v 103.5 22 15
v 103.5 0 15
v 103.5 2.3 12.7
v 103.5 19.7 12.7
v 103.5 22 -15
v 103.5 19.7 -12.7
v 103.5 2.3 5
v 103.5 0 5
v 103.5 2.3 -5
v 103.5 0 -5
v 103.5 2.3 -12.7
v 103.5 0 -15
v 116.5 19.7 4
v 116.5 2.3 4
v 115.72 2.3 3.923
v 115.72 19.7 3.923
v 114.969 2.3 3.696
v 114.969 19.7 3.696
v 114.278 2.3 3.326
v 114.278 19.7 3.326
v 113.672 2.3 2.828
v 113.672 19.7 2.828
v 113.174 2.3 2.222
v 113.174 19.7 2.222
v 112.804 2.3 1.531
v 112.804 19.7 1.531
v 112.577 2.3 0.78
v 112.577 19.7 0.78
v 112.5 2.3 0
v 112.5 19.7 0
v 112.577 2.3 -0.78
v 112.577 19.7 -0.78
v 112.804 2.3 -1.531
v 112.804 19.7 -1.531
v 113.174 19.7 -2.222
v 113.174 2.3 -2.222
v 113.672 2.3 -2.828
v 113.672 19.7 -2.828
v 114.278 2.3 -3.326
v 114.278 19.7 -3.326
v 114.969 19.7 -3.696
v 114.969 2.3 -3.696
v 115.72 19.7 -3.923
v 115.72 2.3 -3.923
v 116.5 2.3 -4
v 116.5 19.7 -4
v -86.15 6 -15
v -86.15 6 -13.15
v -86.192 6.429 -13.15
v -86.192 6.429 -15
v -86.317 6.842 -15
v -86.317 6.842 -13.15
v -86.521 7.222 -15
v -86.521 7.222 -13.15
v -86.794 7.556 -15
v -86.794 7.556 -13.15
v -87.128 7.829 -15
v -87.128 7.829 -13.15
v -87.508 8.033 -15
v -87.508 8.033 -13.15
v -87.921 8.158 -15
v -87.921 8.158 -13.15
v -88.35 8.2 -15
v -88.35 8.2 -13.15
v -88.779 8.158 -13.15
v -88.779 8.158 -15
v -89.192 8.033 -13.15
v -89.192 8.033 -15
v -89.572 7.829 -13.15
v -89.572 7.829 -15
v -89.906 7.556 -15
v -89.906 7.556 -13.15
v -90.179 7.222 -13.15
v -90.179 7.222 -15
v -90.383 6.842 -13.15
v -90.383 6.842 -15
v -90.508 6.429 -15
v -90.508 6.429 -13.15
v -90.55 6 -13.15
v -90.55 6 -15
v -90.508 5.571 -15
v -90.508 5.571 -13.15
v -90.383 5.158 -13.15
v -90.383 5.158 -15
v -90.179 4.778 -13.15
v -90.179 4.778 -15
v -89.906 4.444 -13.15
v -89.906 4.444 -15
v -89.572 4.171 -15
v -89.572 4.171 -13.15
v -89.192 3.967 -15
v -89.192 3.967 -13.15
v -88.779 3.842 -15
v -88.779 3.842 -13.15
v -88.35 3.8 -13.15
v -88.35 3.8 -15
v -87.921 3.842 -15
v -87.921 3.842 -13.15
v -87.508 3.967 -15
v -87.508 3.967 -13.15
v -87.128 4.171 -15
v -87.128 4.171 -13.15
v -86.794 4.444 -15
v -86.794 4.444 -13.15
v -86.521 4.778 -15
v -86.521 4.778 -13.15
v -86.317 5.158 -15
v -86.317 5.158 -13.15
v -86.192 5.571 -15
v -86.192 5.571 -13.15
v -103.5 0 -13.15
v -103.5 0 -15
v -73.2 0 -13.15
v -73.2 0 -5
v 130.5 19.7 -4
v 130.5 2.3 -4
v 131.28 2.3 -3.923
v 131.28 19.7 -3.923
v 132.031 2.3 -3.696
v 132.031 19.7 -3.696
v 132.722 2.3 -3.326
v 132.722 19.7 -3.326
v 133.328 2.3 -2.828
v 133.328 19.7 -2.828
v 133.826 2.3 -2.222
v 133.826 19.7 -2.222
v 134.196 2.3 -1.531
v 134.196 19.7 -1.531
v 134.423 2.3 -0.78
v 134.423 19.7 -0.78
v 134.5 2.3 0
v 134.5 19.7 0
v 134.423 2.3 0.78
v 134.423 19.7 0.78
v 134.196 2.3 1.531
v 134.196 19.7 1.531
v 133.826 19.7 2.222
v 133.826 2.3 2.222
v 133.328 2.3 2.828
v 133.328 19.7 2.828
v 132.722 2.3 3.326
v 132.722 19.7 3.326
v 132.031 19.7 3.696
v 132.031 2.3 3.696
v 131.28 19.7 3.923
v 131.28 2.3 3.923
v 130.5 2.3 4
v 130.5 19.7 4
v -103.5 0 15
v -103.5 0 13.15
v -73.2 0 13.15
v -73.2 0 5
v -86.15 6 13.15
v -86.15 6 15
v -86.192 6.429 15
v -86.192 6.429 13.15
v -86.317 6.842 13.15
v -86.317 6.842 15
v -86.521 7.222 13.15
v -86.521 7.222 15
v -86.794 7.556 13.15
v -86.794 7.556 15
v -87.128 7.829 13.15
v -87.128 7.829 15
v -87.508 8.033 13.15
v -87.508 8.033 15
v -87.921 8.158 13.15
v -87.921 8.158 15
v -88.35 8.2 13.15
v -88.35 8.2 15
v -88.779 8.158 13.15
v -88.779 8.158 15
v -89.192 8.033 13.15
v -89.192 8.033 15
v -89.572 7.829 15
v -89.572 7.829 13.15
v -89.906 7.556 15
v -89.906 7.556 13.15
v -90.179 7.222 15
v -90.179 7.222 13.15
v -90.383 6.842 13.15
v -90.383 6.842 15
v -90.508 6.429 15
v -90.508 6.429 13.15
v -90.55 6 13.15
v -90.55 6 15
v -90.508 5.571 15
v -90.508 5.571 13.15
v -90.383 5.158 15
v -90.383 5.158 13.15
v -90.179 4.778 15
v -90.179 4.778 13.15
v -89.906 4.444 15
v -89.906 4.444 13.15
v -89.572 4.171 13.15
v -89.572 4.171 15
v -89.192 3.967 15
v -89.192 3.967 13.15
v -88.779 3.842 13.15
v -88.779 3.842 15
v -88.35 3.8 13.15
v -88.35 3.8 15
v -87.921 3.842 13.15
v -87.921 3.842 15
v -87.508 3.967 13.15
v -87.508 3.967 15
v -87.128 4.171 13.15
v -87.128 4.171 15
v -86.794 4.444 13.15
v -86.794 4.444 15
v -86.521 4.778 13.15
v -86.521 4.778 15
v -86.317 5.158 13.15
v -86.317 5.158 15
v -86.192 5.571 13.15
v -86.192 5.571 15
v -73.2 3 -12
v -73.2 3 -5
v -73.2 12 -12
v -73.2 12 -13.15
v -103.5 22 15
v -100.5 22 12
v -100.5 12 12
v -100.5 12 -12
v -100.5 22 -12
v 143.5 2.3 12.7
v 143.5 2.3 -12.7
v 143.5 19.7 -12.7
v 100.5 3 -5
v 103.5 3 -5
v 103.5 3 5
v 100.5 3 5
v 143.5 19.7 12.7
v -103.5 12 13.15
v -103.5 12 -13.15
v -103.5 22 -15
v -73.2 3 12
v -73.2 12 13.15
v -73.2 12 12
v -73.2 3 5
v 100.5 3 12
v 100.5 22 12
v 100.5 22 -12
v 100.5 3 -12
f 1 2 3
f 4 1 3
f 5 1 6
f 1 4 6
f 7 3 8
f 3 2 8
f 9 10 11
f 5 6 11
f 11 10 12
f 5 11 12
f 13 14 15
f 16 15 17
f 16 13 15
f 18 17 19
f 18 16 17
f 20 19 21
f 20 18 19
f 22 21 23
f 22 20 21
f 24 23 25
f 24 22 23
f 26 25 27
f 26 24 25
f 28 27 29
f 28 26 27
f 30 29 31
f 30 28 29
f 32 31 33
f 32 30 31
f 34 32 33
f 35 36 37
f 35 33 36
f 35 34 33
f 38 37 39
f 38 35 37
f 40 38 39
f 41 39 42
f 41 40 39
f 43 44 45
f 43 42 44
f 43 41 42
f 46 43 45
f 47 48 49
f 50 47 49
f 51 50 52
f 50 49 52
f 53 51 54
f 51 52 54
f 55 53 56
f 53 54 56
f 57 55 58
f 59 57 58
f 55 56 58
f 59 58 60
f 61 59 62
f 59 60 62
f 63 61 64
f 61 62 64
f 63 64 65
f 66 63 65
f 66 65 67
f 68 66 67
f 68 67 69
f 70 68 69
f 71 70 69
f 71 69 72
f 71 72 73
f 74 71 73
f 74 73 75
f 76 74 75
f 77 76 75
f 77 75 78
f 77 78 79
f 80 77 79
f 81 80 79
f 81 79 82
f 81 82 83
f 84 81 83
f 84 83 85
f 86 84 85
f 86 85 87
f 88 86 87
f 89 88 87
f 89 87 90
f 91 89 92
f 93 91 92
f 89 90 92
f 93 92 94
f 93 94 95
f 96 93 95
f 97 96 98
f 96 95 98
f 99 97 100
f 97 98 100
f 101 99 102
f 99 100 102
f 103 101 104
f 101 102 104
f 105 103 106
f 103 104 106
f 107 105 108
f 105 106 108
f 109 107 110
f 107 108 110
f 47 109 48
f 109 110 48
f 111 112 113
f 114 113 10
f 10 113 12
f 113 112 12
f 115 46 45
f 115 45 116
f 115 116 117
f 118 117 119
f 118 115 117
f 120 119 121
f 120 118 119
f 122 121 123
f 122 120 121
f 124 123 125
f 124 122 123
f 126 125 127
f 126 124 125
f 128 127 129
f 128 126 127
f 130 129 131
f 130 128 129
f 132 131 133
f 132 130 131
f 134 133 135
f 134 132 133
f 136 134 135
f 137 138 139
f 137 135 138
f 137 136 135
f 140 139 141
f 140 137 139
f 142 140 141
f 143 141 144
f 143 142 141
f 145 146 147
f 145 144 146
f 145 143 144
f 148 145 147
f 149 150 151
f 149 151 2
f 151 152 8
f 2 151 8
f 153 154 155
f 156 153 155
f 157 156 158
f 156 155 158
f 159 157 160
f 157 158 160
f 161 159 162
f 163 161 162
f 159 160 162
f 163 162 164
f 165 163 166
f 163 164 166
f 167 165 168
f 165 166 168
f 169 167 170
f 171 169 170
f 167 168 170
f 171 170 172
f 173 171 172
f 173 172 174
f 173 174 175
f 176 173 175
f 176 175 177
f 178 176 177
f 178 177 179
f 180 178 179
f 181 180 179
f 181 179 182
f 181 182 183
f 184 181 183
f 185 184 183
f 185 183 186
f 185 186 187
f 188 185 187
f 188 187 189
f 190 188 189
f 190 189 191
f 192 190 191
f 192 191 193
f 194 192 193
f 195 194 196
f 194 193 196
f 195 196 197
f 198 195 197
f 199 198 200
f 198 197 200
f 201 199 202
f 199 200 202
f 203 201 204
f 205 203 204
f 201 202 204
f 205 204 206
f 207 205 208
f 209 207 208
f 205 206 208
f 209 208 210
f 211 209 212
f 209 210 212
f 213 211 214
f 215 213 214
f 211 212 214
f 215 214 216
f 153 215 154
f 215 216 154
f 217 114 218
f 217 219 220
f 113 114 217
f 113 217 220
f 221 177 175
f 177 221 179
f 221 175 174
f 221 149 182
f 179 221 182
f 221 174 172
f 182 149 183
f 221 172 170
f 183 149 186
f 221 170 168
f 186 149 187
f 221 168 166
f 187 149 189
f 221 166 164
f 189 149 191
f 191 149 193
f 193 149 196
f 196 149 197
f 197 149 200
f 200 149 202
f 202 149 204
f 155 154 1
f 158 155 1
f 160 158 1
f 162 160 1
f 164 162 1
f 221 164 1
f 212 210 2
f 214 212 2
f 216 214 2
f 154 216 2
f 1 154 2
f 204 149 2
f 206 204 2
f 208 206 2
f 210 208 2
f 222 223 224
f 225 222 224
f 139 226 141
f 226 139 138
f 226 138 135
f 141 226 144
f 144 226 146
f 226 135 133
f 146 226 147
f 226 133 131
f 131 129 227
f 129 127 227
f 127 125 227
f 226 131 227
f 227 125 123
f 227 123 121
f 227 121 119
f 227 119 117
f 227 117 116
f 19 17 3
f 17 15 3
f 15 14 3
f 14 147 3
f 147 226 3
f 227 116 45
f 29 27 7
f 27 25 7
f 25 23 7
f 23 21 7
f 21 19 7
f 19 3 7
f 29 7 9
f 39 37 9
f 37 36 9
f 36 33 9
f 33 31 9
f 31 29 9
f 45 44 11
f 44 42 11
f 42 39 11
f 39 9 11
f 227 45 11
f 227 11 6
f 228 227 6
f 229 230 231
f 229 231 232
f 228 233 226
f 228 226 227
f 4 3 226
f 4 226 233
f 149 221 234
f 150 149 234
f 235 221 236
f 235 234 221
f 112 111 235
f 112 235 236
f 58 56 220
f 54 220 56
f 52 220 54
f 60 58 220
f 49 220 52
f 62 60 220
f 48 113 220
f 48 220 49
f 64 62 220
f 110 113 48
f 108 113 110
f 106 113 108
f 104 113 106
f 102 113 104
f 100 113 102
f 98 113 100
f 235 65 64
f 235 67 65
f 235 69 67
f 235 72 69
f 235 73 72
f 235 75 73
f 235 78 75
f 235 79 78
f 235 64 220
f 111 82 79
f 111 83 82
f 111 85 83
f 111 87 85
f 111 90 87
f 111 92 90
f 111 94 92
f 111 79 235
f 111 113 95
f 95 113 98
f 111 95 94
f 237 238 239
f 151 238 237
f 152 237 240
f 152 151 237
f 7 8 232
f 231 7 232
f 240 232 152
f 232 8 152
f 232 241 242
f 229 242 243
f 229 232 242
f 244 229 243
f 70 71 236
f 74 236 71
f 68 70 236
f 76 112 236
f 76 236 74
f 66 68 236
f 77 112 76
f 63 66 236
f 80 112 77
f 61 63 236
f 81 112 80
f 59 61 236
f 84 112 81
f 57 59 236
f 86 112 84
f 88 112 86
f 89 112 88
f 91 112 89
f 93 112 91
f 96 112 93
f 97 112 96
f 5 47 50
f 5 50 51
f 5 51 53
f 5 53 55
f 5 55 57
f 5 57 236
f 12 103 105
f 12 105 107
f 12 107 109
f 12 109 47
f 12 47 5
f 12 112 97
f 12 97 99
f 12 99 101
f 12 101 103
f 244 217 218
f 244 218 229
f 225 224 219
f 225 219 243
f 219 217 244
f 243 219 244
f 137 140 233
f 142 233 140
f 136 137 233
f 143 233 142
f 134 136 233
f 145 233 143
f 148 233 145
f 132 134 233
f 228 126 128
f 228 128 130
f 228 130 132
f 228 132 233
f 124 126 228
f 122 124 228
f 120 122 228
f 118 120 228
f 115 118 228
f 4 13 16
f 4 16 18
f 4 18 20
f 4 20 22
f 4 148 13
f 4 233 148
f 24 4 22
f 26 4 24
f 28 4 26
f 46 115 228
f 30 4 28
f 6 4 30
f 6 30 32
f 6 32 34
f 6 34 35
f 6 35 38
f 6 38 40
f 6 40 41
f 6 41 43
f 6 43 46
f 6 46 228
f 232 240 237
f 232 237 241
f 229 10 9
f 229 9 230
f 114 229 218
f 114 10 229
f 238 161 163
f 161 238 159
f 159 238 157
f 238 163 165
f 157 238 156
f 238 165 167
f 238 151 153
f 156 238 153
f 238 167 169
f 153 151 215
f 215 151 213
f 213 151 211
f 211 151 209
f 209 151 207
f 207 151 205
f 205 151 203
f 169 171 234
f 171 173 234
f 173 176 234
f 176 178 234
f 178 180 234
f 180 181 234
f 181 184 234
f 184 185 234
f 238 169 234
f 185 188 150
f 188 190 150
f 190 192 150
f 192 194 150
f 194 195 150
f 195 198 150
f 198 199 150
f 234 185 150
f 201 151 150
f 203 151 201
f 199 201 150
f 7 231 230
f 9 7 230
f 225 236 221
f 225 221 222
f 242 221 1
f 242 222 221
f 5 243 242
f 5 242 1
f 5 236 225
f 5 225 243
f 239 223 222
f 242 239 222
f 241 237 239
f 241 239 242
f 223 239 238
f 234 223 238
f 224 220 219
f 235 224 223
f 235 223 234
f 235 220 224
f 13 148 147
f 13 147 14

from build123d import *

# Parameters (mm, degrees)
SKETCH1_W           = 207
SKETCH1_H           = 30
BOSS_EXTRUDE1_DEPTH = 22
SHELL1_T            = -3
SKETCH2_W           = 207
SKETCH2_H           = 10
CUT_EXTRUDE1_DEPTH  = 3
SKETCH3_W           = 30.3
SKETCH3_H           = 26.3
CUT_EXTRUDE2_DEPTH  = 12
SKETCH4_R           = 2.2
CUT_EXTRUDE3_DEPTH  = 110.982953225
SKETCH5_W           = 25.4
SKETCH5_H           = 17.4
BOSS_EXTRUDE2_DEPTH = 40
CUT_EXTRUDE4_DEPTH  = 146.620534266


with BuildPart() as part:
    # Sketch1 → Boss-Extrude1 (new body)
    with BuildSketch(Plane(origin=(0, 0, 0), x_dir=(1, 0, 0), z_dir=(0, 1, 0))):
        Rectangle(SKETCH1_W, SKETCH1_H)
    extrude(amount=BOSS_EXTRUDE1_DEPTH)

    # Shell1
    shell1_openings = [part.faces().sort_by_distance(p)[0] for p in [
        (0, 22, 0),
    ]]
    offset(amount=SHELL1_T, openings=shell1_openings, kind=Kind.INTERSECTION)

    # Sketch2 → Cut-Extrude1 (cut)
    with BuildSketch(Plane(origin=(0, 0, 0), x_dir=(-1, 0, 0), z_dir=(0, -1, 0))):
        Rectangle(SKETCH2_W, SKETCH2_H)
    extrude(amount=-CUT_EXTRUDE1_DEPTH, mode=Mode.SUBTRACT)

    # Sketch3 → Cut-Extrude2 (cut)
    with BuildSketch(Plane(origin=(0, 0, 0), x_dir=(-1, 0, 0), z_dir=(0, -1, 0))):
        with Locations((88.35, 0)):
            Rectangle(SKETCH3_W, SKETCH3_H)
    extrude(amount=-CUT_EXTRUDE2_DEPTH, mode=Mode.SUBTRACT)

    # Sketch4 → Cut-Extrude3 (cut, through all)
    with BuildSketch(Plane.XY.offset(15)):
        with Locations((-88.35, 6)):
            Circle(SKETCH4_R)
    extrude(amount=-CUT_EXTRUDE3_DEPTH, mode=Mode.SUBTRACT)

    # Sketch5 → Boss-Extrude2 (add)
    with BuildSketch(Plane(origin=(103.5, 0, 0), x_dir=(0, 0, -1), z_dir=(1, 0, 0))):
        with Locations((0, 11)):
            Rectangle(SKETCH5_W, SKETCH5_H)
    extrude(amount=BOSS_EXTRUDE2_DEPTH)

    # Sketch6 → Cut-Extrude4 (cut, through all)
    with BuildSketch(Plane(origin=(0, 19.7, 0), x_dir=(1, 0, 0), z_dir=(0, 1, 0))):
        with BuildLine():
            Line((116.5, 4), (130.5, 4))
            ThreePointArc((130.5, 4), (134.5, 0), (130.5, -4))
            Line((130.5, -4), (116.5, -4))
            ThreePointArc((116.5, -4), (112.5, 0), (116.5, 4))
        make_face()
    extrude(amount=-CUT_EXTRUDE4_DEPTH, mode=Mode.SUBTRACT)


solid = part.part
